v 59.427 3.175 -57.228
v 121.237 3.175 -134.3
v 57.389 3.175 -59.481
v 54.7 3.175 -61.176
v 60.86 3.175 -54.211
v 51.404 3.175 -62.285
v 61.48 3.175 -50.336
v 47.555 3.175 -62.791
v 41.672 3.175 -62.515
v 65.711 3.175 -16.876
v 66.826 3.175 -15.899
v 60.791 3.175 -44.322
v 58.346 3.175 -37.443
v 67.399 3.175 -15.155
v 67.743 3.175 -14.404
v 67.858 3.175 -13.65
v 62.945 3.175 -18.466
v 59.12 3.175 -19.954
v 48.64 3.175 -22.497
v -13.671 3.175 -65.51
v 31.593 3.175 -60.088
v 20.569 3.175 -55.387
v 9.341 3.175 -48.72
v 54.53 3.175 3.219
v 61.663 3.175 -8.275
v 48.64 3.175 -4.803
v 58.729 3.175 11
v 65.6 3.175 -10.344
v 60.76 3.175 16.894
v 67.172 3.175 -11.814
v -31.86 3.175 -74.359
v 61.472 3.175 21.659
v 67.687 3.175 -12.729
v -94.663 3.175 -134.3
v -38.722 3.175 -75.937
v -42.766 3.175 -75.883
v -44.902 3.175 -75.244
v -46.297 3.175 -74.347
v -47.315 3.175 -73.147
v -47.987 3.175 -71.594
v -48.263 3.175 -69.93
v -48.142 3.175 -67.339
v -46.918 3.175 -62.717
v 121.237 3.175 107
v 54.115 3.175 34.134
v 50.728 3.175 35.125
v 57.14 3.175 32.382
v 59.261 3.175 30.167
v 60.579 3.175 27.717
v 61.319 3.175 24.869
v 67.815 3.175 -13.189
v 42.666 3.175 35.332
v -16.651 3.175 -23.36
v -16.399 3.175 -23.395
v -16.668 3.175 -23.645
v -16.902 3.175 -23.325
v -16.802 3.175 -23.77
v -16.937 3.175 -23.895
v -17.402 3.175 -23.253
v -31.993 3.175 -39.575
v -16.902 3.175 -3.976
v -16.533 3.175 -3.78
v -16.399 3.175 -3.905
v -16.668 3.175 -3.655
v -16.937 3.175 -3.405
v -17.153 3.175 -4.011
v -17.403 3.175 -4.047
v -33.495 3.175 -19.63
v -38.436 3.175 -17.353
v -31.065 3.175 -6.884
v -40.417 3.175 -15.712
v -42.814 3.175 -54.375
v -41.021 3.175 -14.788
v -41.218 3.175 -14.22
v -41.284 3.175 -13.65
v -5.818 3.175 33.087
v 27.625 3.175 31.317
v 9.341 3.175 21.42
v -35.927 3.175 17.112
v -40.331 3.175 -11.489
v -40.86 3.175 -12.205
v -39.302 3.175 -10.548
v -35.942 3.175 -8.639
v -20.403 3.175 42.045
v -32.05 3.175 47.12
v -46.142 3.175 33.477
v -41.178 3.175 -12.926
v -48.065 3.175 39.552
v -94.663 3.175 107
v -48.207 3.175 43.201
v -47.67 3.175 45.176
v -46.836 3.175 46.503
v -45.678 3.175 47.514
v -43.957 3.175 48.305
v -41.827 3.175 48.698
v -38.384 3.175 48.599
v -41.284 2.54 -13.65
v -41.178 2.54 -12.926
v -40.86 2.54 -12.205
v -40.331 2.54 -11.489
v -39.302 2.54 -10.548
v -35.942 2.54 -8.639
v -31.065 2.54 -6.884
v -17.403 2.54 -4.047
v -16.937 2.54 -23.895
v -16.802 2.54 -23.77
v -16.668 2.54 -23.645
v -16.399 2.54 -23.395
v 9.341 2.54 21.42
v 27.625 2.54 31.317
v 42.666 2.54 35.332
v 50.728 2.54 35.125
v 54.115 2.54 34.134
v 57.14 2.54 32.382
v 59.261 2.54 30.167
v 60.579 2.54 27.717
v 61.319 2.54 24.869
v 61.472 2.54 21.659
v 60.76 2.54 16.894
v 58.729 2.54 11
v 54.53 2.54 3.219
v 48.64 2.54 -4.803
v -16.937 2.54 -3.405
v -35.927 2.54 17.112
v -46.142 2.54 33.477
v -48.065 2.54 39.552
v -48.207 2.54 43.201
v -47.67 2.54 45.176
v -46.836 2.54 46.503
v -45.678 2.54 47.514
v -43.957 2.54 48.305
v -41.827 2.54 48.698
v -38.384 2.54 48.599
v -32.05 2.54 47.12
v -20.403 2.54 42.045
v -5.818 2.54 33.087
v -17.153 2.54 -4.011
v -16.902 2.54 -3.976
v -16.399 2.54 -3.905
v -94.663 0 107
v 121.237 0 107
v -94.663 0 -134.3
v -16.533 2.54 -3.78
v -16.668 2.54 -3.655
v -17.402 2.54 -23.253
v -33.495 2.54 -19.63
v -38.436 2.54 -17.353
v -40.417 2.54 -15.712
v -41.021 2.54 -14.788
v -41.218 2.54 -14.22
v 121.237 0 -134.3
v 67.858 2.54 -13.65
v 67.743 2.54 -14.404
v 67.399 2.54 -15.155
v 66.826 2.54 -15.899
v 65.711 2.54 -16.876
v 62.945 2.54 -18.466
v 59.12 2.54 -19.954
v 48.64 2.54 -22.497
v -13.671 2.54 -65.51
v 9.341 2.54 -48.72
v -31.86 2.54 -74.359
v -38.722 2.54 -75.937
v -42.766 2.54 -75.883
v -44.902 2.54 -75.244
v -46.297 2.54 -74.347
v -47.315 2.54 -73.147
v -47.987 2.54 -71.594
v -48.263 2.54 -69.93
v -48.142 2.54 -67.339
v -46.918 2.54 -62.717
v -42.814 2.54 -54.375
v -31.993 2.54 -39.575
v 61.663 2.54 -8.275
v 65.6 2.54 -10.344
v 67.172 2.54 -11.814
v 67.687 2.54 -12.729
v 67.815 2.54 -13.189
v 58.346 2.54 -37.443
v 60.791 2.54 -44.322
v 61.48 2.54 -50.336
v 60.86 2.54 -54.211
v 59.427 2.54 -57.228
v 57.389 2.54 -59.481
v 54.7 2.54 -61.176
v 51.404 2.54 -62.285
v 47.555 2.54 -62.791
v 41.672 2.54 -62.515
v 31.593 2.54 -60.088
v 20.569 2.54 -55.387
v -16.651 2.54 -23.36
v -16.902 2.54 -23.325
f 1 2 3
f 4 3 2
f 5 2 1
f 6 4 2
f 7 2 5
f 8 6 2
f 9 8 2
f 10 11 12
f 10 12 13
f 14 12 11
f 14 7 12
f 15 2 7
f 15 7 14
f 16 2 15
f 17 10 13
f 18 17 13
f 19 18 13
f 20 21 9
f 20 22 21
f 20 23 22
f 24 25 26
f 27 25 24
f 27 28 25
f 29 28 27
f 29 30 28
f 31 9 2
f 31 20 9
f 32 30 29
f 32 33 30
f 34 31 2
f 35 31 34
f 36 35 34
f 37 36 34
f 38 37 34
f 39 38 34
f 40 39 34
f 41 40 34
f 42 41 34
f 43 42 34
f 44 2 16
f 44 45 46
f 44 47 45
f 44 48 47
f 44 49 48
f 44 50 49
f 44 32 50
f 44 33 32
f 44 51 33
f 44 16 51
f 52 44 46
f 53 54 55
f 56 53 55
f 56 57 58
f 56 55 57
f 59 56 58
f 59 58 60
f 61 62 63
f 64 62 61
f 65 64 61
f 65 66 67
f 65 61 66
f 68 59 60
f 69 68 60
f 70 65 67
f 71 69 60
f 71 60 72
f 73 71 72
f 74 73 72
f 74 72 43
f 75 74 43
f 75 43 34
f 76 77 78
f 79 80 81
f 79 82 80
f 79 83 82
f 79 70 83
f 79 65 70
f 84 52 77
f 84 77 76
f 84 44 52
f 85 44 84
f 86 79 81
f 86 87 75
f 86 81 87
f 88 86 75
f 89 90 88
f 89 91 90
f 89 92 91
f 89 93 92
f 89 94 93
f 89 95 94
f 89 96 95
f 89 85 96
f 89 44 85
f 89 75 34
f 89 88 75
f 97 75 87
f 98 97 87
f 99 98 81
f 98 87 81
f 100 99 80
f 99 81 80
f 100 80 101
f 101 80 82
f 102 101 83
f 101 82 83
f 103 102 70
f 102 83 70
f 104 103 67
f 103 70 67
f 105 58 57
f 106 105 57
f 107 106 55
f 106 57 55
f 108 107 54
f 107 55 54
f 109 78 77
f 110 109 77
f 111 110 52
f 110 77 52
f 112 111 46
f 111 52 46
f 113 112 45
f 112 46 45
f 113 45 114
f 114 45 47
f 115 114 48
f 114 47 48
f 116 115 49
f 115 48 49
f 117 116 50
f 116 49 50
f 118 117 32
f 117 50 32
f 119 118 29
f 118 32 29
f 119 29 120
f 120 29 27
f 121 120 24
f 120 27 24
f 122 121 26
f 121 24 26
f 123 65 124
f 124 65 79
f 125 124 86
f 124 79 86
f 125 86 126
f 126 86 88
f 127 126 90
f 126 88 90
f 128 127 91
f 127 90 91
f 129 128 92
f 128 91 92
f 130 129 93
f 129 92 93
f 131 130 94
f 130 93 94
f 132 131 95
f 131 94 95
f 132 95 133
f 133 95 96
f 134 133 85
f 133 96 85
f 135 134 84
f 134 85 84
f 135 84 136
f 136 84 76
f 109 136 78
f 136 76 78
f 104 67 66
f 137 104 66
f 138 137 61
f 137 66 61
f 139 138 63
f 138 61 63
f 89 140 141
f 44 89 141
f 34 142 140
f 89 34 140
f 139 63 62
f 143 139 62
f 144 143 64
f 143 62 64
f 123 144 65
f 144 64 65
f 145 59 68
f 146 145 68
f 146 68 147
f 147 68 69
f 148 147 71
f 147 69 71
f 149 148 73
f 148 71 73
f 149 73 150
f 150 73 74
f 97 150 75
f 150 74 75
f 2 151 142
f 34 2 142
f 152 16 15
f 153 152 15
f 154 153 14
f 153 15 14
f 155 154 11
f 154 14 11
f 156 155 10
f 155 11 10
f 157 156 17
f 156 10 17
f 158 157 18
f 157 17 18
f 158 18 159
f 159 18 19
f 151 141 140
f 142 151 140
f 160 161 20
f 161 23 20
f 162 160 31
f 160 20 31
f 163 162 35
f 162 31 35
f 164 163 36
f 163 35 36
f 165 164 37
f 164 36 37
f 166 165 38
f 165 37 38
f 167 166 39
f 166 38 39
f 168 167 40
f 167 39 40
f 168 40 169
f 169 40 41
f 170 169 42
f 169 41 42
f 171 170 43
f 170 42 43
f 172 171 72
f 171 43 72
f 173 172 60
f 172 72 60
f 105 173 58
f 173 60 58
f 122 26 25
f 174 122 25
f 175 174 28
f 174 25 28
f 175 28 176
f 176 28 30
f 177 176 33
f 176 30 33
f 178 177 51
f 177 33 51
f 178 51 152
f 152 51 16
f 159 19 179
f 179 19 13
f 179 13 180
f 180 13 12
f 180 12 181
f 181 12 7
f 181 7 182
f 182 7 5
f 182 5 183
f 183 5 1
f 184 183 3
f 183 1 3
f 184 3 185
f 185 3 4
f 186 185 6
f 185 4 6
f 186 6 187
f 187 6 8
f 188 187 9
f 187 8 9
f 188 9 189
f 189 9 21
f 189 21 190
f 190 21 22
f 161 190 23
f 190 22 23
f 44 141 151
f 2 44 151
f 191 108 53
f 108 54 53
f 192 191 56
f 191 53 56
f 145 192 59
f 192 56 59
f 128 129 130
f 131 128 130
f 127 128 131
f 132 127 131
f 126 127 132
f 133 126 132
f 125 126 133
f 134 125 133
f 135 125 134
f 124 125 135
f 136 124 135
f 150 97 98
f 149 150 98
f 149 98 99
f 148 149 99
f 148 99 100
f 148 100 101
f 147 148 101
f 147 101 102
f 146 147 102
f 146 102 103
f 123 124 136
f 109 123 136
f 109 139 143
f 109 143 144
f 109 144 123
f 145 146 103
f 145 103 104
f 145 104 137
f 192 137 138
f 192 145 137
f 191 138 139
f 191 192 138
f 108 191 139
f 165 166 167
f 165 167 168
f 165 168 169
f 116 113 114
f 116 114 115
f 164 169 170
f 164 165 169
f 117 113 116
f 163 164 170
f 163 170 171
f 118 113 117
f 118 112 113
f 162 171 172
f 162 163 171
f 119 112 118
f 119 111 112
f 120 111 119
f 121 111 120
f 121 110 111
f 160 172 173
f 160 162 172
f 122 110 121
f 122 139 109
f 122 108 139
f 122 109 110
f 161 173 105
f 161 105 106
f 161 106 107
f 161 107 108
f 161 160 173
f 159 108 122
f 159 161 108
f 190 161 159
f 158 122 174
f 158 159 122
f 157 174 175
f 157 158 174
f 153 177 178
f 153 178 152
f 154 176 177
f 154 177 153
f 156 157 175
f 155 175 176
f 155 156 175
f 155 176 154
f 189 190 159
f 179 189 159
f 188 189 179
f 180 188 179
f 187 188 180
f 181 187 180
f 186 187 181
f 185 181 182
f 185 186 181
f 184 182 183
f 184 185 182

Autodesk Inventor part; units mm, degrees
ref_plane "YZ Plane" through (0, 0, 0) normal (1, 0, 0) x (0, 1, 0)
ref_plane "XZ Plane" through (0, 0, 0) normal (0, 1, 0) x (-1, 0, 0)
ref_plane "XY Plane" through (0, 0, 0) normal (0, 0, 1) x (1, 0, 0)
sketch "Sketch1" plane through (0, 0, 0) normal (0, 1, 0) x (-1, 0, 0)
  line L0 (94.6629, 106.9998) -> (-121.2371, 106.9998)
  line L1 (-121.2371, 106.9998) -> (-121.2371, -134.3002)
  line L2 (-121.2371, -134.3002) -> (94.6629, -134.3002)
  line L3 (94.6629, -134.3002) -> (94.6629, 106.9998)
  point P0 (0, 0)
  dimension "d0" = 241.3
  dimension "d1" = 215.9
extrude "Extrusion1" add sketch "Sketch1" along normal blind 3.175
sketch "Sketch2" plane through (0, 3.175, 0) normal (0, 1, 0) x (1, 0, 0)
  ellipse E0 centre (0, 32.9329) end of major axis (-46.7996, 73.8447) minor radius 18.0599 (9.3407, 48.7201) -> (-16.3986, 23.3952) ccw
  ellipse E1 centre (17.4405, 25.2301) end of major axis (58.9723, 57.8521) minor radius 23.76 (48.6403, 22.4972) -> (9.3407, 48.7201) ccw
  ellipse E2 centre (17.4405, 25.2301) end of major axis (58.9723, 57.8521) minor radius 23.76 (-16.9368, 23.8952) -> (-17.4025, 23.2533) ccw
  ellipse E3 centre (13.2871, 13.6502) end of major axis (-41.2842, 13.6502) minor radius 11.6136 (-16.3986, 23.3952) -> (-41.2842, 13.6502) ccw
  ellipse E4 centre (13.2871, 13.6502) end of major axis (-41.2842, 13.6502) minor radius 11.6136 (67.8584, 13.6502) -> (48.6403, 22.4972) ccw
  ellipse E5 centre (0, -5.6325) end of major axis (-46.7996, -46.5443) minor radius 18.0599 (-16.3986, 3.9052) -> (9.3407, -21.4198) ccw
  ellipse E6 centre (17.4405, 2.0702) end of major axis (58.9723, -30.5517) minor radius 23.76 (9.3407, -21.4198) -> (48.6403, 4.8031) ccw
  ellipse E7 centre (17.4405, 2.0702) end of major axis (58.9723, -30.5517) minor radius 23.76 (-17.4025, 4.0471) -> (-16.9368, 3.4052) ccw
  ellipse E8 centre (13.2871, 13.6502) end of major axis (-41.2842, 13.6502) minor radius 11.6136 (-41.2842, 13.6502) -> (-16.3986, 3.9052) ccw
  ellipse E9 centre (13.2871, 13.6502) end of major axis (-41.2842, 13.6502) minor radius 11.6136 (48.6403, 4.8031) -> (67.8584, 13.6502) ccw
  point P0 (0, 0)
extrude "Extrusion2" cut sketch "Sketch2" against normal blind 0.635 contours E1 E4 E9 E6 E5 E8 E3 E0
properties part number "Butterfly Logo plexiglass plane"
